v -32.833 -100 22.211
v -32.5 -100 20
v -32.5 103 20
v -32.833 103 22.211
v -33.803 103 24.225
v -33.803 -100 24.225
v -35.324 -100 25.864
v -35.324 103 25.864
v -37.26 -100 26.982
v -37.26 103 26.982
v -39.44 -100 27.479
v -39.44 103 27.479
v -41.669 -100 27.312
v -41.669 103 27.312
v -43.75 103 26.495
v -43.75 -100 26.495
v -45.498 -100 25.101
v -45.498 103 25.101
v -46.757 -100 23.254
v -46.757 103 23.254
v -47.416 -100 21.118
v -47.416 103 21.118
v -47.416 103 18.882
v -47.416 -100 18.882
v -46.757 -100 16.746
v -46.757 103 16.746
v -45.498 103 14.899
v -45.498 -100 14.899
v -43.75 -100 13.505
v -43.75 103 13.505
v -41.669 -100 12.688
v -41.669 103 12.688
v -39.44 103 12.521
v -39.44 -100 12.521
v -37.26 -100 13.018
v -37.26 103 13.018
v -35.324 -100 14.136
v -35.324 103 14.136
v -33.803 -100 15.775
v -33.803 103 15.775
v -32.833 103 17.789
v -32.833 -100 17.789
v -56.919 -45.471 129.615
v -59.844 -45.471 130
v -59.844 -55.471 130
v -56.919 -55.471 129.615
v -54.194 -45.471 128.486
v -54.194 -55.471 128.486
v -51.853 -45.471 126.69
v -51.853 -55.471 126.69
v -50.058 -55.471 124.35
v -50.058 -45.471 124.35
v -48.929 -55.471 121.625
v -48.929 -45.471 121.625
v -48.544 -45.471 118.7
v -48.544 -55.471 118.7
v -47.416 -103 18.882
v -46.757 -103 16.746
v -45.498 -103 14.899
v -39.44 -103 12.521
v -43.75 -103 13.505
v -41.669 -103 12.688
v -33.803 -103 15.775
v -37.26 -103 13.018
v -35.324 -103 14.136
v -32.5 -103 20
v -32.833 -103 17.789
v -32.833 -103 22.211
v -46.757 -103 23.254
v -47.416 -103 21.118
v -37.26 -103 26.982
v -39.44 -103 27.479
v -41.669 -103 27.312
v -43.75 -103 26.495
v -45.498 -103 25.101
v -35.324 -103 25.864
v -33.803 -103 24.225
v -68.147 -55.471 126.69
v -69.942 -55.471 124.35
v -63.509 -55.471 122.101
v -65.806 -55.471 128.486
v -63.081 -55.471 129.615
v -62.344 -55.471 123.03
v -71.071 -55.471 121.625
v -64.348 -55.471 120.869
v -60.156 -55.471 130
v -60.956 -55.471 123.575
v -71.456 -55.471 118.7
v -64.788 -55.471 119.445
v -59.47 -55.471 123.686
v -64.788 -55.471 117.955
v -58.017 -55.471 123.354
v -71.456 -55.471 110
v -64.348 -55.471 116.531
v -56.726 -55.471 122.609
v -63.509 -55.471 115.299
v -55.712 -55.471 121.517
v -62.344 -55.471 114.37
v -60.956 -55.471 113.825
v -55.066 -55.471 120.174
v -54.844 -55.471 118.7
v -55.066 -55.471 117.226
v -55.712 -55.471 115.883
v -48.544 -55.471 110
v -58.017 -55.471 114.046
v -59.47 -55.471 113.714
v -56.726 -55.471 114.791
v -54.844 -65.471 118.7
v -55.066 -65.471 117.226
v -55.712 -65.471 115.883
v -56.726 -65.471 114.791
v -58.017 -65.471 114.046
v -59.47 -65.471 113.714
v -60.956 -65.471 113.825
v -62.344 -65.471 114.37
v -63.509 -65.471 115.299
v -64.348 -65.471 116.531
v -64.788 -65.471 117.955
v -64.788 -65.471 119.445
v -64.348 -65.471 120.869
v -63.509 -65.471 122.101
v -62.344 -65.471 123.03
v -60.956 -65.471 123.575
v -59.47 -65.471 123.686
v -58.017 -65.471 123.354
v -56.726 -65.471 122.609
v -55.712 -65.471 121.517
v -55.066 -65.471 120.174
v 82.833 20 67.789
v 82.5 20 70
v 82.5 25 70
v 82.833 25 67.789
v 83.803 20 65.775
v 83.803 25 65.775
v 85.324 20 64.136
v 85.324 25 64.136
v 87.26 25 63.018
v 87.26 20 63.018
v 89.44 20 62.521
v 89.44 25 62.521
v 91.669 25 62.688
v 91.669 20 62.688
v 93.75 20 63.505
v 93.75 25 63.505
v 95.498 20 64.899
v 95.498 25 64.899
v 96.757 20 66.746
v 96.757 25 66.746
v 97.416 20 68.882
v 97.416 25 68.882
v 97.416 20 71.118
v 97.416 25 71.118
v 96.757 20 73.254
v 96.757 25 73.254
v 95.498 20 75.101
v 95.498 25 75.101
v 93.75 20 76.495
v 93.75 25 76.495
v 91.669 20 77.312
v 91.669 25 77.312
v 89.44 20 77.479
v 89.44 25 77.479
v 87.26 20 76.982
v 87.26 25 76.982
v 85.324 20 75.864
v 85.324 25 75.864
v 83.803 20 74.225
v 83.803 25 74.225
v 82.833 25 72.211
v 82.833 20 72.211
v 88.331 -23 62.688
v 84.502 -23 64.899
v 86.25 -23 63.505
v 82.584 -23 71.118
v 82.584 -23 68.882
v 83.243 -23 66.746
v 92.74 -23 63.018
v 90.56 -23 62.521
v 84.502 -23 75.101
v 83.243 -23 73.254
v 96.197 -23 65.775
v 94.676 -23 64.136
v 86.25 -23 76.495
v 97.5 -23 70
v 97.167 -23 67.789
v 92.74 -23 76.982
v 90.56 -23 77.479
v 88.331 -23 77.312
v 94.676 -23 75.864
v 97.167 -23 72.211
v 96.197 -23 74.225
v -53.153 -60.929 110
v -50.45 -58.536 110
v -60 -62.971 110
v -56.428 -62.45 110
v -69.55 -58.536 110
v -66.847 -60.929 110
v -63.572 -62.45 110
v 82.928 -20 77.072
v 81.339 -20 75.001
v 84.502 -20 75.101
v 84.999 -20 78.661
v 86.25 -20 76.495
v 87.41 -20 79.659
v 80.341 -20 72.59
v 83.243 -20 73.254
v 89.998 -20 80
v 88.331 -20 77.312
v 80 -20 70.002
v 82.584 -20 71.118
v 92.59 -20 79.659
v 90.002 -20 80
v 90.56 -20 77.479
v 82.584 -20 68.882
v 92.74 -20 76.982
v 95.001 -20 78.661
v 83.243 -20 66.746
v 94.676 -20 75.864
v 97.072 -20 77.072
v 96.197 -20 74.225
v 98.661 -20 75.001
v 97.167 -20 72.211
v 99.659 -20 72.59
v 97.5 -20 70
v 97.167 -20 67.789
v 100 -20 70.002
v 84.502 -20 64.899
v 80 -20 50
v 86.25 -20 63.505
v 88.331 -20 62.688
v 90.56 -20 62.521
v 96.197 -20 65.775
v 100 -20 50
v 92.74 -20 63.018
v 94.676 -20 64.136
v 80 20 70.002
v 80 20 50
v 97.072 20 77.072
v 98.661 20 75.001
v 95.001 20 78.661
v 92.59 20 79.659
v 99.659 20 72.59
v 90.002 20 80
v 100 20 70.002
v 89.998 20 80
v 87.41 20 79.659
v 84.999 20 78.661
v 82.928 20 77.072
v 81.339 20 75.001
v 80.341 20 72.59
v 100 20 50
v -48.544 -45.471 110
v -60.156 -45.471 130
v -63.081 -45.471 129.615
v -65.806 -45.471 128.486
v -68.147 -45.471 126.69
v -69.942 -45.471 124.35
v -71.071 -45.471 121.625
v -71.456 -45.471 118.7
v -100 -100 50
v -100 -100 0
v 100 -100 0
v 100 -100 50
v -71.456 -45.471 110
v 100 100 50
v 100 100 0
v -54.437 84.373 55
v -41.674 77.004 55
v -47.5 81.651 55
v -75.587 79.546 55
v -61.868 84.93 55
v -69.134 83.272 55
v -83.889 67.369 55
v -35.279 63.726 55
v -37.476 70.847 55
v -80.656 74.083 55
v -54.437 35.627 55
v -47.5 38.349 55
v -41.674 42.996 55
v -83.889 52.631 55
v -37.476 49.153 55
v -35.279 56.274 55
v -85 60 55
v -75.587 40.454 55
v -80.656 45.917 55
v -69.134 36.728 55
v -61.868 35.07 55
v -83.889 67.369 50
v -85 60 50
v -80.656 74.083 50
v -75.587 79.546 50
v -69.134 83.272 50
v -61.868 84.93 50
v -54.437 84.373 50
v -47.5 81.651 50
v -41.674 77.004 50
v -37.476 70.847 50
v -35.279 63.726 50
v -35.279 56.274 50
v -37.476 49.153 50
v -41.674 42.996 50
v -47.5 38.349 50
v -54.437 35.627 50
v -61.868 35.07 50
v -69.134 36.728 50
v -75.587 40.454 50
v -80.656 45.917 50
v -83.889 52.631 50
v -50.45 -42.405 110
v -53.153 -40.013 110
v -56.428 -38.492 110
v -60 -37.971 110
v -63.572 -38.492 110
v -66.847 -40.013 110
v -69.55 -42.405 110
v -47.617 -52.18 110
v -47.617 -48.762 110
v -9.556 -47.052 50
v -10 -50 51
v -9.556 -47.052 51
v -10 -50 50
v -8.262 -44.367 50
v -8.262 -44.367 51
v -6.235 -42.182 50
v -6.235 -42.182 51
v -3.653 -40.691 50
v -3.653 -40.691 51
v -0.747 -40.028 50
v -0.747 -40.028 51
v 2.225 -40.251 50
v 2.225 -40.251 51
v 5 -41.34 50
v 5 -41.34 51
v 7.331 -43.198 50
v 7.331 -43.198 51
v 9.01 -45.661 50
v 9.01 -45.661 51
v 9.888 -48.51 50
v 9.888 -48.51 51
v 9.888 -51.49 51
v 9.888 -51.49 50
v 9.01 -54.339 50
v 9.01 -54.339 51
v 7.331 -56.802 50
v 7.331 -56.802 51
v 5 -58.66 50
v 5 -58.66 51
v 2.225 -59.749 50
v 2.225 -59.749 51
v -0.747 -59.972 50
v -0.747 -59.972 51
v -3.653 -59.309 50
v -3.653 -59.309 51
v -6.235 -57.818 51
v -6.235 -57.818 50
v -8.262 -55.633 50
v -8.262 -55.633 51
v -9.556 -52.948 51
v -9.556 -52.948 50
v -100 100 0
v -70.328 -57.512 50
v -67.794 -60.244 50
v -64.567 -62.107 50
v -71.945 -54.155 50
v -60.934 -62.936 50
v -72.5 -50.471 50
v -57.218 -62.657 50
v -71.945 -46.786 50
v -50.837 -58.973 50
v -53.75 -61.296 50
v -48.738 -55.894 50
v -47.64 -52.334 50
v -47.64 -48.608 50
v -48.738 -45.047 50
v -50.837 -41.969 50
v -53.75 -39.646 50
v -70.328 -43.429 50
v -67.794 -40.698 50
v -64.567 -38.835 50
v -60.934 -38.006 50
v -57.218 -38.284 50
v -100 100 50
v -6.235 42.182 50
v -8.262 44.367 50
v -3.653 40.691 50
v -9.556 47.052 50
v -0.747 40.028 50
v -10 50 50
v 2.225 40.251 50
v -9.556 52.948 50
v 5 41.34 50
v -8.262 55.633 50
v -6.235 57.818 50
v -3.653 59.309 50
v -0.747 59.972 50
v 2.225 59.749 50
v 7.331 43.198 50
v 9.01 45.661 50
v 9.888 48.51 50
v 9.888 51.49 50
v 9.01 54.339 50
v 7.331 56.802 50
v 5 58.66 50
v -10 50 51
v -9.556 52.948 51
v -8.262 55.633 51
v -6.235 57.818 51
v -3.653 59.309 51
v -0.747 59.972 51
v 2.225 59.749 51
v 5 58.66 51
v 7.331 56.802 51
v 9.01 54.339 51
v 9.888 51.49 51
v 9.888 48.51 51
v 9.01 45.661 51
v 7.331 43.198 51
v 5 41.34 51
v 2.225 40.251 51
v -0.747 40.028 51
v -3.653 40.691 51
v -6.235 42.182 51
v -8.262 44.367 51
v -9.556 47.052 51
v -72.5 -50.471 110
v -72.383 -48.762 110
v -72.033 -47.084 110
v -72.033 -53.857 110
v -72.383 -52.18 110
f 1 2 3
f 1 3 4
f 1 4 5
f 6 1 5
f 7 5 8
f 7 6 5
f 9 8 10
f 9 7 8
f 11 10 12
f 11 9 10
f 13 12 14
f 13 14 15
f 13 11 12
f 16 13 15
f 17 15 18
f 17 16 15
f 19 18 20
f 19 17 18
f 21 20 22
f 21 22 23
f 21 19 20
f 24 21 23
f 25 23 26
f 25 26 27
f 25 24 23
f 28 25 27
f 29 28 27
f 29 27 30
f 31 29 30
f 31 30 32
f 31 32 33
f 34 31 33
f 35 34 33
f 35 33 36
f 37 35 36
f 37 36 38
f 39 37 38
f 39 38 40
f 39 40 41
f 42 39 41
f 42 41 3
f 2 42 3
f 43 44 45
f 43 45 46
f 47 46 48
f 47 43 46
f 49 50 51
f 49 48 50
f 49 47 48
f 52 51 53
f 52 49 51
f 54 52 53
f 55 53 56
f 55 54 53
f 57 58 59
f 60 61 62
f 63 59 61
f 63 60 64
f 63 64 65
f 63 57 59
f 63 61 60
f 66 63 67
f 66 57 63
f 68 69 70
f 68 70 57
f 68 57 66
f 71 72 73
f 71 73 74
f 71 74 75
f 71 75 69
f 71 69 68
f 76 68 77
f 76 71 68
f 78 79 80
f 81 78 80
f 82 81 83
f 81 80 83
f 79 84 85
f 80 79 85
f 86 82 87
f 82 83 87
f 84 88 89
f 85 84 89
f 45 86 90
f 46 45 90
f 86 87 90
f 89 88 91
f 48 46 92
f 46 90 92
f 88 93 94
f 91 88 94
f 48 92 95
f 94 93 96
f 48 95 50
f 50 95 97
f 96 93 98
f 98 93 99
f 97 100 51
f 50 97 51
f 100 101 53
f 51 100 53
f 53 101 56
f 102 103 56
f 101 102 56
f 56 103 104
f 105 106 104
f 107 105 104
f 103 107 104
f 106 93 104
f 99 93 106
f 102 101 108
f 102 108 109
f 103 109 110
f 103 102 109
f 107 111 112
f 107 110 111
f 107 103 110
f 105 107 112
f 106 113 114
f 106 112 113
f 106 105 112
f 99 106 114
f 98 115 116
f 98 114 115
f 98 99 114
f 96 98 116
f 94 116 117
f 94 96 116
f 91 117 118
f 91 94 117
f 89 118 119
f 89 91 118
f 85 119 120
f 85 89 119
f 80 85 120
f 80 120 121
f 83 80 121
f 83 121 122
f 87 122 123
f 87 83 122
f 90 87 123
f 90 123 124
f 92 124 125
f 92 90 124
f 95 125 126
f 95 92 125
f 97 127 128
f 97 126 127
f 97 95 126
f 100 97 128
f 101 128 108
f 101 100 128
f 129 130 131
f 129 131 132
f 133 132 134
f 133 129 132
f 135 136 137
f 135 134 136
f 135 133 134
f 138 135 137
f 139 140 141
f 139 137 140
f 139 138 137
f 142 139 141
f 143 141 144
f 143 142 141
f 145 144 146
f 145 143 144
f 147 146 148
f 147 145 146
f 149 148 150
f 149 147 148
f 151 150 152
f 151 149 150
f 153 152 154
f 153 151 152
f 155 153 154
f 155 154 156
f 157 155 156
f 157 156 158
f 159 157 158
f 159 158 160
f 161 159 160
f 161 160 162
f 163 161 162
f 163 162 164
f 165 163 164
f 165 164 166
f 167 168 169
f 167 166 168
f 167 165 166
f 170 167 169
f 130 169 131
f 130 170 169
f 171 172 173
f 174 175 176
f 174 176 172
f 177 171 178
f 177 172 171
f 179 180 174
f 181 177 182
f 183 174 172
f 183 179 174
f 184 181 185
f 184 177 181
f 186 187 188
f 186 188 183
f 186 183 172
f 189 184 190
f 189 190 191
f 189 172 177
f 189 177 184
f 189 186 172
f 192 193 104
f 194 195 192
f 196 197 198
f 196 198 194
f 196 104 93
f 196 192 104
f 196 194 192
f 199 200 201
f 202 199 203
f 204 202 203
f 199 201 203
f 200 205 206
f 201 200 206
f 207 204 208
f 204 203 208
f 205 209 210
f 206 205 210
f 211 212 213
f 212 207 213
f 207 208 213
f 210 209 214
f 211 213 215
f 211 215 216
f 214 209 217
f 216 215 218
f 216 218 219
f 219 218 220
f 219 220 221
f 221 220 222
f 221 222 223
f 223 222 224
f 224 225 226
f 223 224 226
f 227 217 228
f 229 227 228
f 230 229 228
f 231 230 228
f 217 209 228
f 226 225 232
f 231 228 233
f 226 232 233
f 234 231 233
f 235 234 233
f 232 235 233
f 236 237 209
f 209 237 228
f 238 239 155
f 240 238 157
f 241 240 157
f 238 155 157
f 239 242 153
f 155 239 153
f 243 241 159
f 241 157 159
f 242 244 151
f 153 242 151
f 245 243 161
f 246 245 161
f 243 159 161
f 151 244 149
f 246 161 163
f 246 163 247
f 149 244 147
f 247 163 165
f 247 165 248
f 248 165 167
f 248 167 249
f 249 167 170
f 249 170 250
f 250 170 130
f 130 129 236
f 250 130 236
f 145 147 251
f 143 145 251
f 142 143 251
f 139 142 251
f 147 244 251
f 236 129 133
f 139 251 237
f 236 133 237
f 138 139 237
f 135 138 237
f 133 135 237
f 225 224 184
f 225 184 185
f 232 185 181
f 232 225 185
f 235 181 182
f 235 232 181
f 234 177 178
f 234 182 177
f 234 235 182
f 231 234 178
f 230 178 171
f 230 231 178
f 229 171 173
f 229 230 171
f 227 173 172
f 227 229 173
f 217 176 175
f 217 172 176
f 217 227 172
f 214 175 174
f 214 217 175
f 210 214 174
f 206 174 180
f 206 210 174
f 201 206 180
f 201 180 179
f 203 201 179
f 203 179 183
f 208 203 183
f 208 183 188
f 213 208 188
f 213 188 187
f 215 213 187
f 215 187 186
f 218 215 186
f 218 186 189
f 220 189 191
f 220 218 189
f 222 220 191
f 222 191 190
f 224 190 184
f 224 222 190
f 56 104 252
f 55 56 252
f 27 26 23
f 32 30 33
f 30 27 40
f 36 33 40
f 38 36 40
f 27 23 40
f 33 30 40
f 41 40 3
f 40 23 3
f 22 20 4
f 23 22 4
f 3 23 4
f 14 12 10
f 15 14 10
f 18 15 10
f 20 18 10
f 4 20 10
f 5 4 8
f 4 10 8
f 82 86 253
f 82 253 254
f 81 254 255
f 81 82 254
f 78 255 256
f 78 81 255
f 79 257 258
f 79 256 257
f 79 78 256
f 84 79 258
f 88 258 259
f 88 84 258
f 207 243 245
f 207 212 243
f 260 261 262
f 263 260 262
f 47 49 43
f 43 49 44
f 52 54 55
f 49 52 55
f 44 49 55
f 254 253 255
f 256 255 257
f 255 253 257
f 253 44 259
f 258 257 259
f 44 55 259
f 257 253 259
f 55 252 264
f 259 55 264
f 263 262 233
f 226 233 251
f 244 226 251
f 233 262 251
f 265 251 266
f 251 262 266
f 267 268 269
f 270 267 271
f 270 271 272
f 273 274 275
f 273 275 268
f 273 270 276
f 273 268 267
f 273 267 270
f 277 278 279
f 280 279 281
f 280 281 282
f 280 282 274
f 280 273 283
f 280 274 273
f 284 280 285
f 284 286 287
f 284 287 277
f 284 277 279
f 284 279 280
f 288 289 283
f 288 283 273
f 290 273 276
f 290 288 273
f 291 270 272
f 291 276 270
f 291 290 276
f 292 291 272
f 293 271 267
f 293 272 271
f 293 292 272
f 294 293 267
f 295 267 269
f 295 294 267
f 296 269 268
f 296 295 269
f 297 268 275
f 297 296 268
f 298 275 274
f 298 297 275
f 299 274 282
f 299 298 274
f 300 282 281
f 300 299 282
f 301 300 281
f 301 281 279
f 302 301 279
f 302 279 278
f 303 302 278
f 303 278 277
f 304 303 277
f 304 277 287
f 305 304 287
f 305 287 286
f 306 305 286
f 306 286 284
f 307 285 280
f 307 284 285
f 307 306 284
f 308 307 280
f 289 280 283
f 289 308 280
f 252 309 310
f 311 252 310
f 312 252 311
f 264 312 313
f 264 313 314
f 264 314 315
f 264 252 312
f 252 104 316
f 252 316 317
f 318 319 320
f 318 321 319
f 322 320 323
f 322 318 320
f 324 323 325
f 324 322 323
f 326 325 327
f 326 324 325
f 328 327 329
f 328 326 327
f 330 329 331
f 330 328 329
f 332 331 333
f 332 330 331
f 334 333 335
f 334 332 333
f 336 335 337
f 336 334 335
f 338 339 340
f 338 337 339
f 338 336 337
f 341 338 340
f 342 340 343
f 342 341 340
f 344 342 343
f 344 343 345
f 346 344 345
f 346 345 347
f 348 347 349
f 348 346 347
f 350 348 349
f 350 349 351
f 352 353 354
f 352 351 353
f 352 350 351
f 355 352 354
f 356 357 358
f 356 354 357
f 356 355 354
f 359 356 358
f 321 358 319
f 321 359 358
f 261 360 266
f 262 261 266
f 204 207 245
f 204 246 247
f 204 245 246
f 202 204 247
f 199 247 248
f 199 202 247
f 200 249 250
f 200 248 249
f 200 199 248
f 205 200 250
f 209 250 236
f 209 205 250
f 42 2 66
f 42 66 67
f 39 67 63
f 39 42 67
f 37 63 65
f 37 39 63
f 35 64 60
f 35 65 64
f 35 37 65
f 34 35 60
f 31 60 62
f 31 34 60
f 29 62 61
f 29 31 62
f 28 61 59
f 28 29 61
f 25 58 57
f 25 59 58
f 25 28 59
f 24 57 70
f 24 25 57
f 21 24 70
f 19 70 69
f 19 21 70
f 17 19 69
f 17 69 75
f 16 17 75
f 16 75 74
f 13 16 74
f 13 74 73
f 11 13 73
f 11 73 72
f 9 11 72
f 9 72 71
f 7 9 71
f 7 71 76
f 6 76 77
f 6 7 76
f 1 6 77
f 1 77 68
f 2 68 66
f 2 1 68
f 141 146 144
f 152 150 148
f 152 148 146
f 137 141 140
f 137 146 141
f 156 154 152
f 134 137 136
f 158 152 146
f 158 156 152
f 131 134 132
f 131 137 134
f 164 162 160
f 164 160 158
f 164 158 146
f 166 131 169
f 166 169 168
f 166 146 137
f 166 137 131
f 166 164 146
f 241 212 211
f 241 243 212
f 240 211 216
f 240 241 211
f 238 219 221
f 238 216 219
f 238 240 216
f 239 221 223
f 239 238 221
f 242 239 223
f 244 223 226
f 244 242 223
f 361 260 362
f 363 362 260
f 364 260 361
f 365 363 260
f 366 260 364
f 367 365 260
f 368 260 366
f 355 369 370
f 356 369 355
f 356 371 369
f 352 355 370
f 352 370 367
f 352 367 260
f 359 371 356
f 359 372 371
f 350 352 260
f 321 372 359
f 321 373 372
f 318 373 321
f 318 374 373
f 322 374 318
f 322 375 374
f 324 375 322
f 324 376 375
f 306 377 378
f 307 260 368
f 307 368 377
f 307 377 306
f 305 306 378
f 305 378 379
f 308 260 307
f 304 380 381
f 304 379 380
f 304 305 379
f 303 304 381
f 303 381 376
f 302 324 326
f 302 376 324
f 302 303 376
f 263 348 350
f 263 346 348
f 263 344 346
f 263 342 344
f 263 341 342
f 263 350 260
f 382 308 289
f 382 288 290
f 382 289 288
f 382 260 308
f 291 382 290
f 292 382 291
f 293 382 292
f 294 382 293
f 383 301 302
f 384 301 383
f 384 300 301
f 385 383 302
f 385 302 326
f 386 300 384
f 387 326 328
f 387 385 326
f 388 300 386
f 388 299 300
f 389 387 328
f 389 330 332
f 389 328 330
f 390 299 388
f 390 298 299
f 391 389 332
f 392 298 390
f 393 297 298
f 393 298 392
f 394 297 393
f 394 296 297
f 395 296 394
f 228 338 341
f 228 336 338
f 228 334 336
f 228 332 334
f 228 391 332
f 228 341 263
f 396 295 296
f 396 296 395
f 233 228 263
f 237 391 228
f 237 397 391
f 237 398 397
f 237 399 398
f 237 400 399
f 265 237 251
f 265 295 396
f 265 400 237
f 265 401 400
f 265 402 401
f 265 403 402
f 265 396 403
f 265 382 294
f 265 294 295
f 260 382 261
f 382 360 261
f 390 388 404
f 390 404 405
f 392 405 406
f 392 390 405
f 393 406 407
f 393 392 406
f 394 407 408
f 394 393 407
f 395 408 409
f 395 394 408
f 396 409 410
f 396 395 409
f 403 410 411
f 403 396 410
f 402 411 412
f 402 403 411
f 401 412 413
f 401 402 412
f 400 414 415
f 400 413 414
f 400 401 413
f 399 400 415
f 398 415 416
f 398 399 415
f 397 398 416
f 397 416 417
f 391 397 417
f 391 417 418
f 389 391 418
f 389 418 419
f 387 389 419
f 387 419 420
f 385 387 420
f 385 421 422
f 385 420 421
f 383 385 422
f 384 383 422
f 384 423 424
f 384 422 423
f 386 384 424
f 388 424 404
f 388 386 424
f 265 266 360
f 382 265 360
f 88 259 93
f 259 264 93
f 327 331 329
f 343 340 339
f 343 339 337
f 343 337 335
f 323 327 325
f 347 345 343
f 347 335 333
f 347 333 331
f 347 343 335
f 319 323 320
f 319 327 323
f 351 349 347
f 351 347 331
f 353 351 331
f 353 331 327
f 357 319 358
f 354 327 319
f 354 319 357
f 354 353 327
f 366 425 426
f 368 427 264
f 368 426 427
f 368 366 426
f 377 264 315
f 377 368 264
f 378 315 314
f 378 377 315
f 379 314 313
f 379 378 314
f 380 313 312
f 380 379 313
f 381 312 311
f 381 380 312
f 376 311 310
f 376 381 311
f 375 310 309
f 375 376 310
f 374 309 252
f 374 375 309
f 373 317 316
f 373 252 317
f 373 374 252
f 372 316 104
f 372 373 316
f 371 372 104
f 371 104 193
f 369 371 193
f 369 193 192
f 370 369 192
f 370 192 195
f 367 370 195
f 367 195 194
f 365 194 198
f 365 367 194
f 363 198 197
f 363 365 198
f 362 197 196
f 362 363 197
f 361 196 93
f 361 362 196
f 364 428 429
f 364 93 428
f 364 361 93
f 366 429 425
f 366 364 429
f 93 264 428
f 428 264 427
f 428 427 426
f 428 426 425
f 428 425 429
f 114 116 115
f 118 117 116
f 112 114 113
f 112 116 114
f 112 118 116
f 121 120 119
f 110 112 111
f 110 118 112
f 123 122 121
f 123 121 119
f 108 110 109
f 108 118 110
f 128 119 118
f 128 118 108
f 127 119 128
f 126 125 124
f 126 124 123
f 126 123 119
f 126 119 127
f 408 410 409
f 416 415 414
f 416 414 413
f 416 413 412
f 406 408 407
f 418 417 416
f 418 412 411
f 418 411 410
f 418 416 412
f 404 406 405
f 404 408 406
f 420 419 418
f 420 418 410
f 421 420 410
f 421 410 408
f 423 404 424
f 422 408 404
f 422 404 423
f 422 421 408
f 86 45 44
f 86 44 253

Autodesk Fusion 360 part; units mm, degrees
sketch "Sketch1" plane through (0, 0, 0) normal (0, 0, 1) x (1, 0, 0)
  line L0 (100, 100) -> (-100, 100)
  line L1 (-100, 100) -> (-100, -100)
  line L2 (-100, -100) -> (100, -100)
  line L3 (100, -100) -> (100, 100)
  line L4 (100, 100) -> (-100, -100) construction
  line L5 (-100, 100) -> (100, -100) construction
  dimension "d1" = 200
  dimension "d2" = 200
extrude "Extrude1" add sketch "Sketch1" along normal blind 50 makes body 1
sketch "Sketch2" plane through (0, 0, 50) normal (0, 0, 1) x (-1, 0, 0)
  line L0 (-100, 100) -> (-100, -100)
  line L1 (-100, -100) -> (100, -100)
  line L2 (100, -100) -> (100, 100)
  line L3 (100, 100) -> (-100, 100)
  circle A0 centre (60, 50.4709) radius 12.5
  dimension "d5" = 25
  dimension "d6" = 40
extrude "Extrude2" add sketch "Sketch2" along normal blind 60 contours A0 bodies 1
sketch "Sketch3" plane through (0, 0, 110) normal (0, 0, 1) x (-1, 0, 0)
  circle A0 centre (60, 50.4709) radius 12.5
  line L0 (71.4564, 55.4709) -> (48.5436, 55.4709)
  line L1 (48.5436, 55.4709) -> (48.5436, 45.4709)
  line L2 (48.5436, 45.4709) -> (71.4564, 45.4709)
  line L3 (71.4564, 45.4709) -> (71.4564, 55.4709)
  line L4 (71.4564, 55.4709) -> (48.5436, 45.4709) construction
  line L5 (48.5436, 55.4709) -> (71.4564, 45.4709) construction
  circle A1 centre (60, 50.4709) radius 12.5
  point P0 (60, 50.4709)
  dimension "d10" = 10
extrude "Extrude3" add sketch "Sketch3" along normal blind 20 contours L0 L1 L2 L3 bodies 1
fillet "Fillet1" radius 11.3 2 edges at (-71.4564, -50.4709, 130) (-48.5436, -50.4709, 130) on bodies 1
sketch "Sketch4" plane through (0, -55.4709, 0) normal (0, -1, 0) x (1, 0, 0)
  arc A0 (-48.5436, 118.7) -> (-59.8436, 130) centre (-59.8436, 118.7) ccw
  line L0 (-59.8436, 130) -> (-60.1564, 130)
  arc A1 (-60.1564, 130) -> (-71.4564, 118.7) centre (-60.1564, 118.7) ccw
  line L1 (-71.4564, 118.7) -> (-71.4564, 110)
  line L2 (-71.4564, 110) -> (-48.5436, 110)
  line L3 (-48.5436, 110) -> (-48.5436, 118.7)
  circle A2 centre (-59.8436, 118.7) radius 5
  dimension "d18" = 10
extrude "Extrude4" add sketch "Sketch4" along normal blind 10 contours A2 bodies 1
sketch "Sketch5" plane through (0, 0, 50) normal (0, 0, 1) x (-1, 0, 0)
  circle A0 centre (60, 50.4709) radius 12.5
  line L0 (-100, 100) -> (-100, -100)
  line L1 (-100, -100) -> (100, -100)
  line L2 (100, -100) -> (100, 100)
  line L3 (100, 100) -> (-100, 100)
  line L4 (100, -60) -> (0, -60) construction
  line L5 (60, -100) -> (60, 0) construction
  circle A1 centre (60, -60) radius 25
  dimension "d21" = 50
extrude "Extrude5" add sketch "Sketch5" along normal blind 5 contours A1 bodies 1
sketch "Sketch6" plane through (0, -100, 0) normal (0, -1, 0) x (1, 0, 0)
  line L0 (-100, 0) -> (100, 0)
  line L1 (100, 0) -> (100, 50)
  line L2 (100, 50) -> (-100, 50)
  line L3 (-100, 50) -> (-100, 0)
  circle A0 centre (-40, 20) radius 7.5
  dimension "d24" = 15
  dimension "d25" = 60
  dimension "d26" = 20
extrude "Extrude6" add sketch "Sketch6" along normal blind 3 and the other way blind 203 separate body contours A0 makes body 2
sketch "Sketch7" plane through (0, 0, 50) normal (0, 0, 1) x (-1, 0, 0)
  circle A0 centre (60, -60) radius 25
  circle A1 centre (60, 50.4709) radius 12.5
  line L0 (-100, 100) -> (-100, -100)
  line L1 (-100, -100) -> (100, -100)
  line L2 (100, -100) -> (100, 100)
  line L3 (100, 100) -> (-100, 100)
  line L4 (-100, -20) -> (-80, -20)
  line L5 (-80, -20) -> (-80, 20)
  line L6 (-80, 20) -> (-100, 20)
  line L7 (-100, 20) -> (-100, -20)
  dimension "d31" = 20
  dimension "d32" = 40
extrude "Extrude7" add sketch "Sketch7" along normal blind 30 contours L0 L4 L5 L6 L7 bodies 1
fillet "Fillet2" radius 10 2 edges at (100, 0, 80) (80, 0, 80) on bodies 1
sketch "Sketch8" plane through (0, -20, 0) normal (0, -1, 0) x (1, 0, 0)
  arc A0 (100, 70) -> (80, 70) centre (90, 70) ccw
  line L0 (80, 70) -> (80, 50)
  line L1 (80, 50) -> (100, 50)
  line L2 (100, 50) -> (100, 70)
  circle A1 centre (90, 70) radius 7.5
  dimension "d37" = 15
extrude "Extrude8" add sketch "Sketch8" along normal blind 3 contours A1 bodies 1
sketch "Sketch9" plane through (0, 0, 50) normal (0, 0, 1) x (-1, 0, 0)
  line L0 (-80, -20) -> (-100, -20)
  line L1 (-100, -20) -> (-100, -100)
  line L2 (-100, -100) -> (100, -100)
  line L3 (100, -100) -> (100, 100)
  line L4 (100, 100) -> (-100, 100)
  line L5 (-100, 100) -> (-100, 20)
  line L6 (-100, 20) -> (-80, 20)
  line L7 (-80, 20) -> (-80, -20)
  circle A0 centre (60, -60) radius 25
  circle A1 centre (60, 50.4709) radius 12.5
  circle A2 centre (0, 50) radius 10
  circle A3 centre (0, -50) radius 10
  dimension "d40" = 20
  dimension "d41" = 20
extrude "Extrude9" add sketch "Sketch9" along normal blind 1 contours A2 | A3 bodies 1
sketch "Sketch10" plane through (0, 20, 0) normal (0, 1, 0) x (-1, 0, 0)
  arc A0 (-80, 70) -> (-100, 70) centre (-90, 70) ccw
  line L0 (-100, 70) -> (-100, 50)
  line L1 (-100, 50) -> (-80, 50)
  line L2 (-80, 50) -> (-80, 70)
  circle A1 centre (-90, 70) radius 7.5
  dimension "d44" = 15
extrude "Extrude10" add sketch "Sketch10" along normal blind 5 contours A1 bodies 1
